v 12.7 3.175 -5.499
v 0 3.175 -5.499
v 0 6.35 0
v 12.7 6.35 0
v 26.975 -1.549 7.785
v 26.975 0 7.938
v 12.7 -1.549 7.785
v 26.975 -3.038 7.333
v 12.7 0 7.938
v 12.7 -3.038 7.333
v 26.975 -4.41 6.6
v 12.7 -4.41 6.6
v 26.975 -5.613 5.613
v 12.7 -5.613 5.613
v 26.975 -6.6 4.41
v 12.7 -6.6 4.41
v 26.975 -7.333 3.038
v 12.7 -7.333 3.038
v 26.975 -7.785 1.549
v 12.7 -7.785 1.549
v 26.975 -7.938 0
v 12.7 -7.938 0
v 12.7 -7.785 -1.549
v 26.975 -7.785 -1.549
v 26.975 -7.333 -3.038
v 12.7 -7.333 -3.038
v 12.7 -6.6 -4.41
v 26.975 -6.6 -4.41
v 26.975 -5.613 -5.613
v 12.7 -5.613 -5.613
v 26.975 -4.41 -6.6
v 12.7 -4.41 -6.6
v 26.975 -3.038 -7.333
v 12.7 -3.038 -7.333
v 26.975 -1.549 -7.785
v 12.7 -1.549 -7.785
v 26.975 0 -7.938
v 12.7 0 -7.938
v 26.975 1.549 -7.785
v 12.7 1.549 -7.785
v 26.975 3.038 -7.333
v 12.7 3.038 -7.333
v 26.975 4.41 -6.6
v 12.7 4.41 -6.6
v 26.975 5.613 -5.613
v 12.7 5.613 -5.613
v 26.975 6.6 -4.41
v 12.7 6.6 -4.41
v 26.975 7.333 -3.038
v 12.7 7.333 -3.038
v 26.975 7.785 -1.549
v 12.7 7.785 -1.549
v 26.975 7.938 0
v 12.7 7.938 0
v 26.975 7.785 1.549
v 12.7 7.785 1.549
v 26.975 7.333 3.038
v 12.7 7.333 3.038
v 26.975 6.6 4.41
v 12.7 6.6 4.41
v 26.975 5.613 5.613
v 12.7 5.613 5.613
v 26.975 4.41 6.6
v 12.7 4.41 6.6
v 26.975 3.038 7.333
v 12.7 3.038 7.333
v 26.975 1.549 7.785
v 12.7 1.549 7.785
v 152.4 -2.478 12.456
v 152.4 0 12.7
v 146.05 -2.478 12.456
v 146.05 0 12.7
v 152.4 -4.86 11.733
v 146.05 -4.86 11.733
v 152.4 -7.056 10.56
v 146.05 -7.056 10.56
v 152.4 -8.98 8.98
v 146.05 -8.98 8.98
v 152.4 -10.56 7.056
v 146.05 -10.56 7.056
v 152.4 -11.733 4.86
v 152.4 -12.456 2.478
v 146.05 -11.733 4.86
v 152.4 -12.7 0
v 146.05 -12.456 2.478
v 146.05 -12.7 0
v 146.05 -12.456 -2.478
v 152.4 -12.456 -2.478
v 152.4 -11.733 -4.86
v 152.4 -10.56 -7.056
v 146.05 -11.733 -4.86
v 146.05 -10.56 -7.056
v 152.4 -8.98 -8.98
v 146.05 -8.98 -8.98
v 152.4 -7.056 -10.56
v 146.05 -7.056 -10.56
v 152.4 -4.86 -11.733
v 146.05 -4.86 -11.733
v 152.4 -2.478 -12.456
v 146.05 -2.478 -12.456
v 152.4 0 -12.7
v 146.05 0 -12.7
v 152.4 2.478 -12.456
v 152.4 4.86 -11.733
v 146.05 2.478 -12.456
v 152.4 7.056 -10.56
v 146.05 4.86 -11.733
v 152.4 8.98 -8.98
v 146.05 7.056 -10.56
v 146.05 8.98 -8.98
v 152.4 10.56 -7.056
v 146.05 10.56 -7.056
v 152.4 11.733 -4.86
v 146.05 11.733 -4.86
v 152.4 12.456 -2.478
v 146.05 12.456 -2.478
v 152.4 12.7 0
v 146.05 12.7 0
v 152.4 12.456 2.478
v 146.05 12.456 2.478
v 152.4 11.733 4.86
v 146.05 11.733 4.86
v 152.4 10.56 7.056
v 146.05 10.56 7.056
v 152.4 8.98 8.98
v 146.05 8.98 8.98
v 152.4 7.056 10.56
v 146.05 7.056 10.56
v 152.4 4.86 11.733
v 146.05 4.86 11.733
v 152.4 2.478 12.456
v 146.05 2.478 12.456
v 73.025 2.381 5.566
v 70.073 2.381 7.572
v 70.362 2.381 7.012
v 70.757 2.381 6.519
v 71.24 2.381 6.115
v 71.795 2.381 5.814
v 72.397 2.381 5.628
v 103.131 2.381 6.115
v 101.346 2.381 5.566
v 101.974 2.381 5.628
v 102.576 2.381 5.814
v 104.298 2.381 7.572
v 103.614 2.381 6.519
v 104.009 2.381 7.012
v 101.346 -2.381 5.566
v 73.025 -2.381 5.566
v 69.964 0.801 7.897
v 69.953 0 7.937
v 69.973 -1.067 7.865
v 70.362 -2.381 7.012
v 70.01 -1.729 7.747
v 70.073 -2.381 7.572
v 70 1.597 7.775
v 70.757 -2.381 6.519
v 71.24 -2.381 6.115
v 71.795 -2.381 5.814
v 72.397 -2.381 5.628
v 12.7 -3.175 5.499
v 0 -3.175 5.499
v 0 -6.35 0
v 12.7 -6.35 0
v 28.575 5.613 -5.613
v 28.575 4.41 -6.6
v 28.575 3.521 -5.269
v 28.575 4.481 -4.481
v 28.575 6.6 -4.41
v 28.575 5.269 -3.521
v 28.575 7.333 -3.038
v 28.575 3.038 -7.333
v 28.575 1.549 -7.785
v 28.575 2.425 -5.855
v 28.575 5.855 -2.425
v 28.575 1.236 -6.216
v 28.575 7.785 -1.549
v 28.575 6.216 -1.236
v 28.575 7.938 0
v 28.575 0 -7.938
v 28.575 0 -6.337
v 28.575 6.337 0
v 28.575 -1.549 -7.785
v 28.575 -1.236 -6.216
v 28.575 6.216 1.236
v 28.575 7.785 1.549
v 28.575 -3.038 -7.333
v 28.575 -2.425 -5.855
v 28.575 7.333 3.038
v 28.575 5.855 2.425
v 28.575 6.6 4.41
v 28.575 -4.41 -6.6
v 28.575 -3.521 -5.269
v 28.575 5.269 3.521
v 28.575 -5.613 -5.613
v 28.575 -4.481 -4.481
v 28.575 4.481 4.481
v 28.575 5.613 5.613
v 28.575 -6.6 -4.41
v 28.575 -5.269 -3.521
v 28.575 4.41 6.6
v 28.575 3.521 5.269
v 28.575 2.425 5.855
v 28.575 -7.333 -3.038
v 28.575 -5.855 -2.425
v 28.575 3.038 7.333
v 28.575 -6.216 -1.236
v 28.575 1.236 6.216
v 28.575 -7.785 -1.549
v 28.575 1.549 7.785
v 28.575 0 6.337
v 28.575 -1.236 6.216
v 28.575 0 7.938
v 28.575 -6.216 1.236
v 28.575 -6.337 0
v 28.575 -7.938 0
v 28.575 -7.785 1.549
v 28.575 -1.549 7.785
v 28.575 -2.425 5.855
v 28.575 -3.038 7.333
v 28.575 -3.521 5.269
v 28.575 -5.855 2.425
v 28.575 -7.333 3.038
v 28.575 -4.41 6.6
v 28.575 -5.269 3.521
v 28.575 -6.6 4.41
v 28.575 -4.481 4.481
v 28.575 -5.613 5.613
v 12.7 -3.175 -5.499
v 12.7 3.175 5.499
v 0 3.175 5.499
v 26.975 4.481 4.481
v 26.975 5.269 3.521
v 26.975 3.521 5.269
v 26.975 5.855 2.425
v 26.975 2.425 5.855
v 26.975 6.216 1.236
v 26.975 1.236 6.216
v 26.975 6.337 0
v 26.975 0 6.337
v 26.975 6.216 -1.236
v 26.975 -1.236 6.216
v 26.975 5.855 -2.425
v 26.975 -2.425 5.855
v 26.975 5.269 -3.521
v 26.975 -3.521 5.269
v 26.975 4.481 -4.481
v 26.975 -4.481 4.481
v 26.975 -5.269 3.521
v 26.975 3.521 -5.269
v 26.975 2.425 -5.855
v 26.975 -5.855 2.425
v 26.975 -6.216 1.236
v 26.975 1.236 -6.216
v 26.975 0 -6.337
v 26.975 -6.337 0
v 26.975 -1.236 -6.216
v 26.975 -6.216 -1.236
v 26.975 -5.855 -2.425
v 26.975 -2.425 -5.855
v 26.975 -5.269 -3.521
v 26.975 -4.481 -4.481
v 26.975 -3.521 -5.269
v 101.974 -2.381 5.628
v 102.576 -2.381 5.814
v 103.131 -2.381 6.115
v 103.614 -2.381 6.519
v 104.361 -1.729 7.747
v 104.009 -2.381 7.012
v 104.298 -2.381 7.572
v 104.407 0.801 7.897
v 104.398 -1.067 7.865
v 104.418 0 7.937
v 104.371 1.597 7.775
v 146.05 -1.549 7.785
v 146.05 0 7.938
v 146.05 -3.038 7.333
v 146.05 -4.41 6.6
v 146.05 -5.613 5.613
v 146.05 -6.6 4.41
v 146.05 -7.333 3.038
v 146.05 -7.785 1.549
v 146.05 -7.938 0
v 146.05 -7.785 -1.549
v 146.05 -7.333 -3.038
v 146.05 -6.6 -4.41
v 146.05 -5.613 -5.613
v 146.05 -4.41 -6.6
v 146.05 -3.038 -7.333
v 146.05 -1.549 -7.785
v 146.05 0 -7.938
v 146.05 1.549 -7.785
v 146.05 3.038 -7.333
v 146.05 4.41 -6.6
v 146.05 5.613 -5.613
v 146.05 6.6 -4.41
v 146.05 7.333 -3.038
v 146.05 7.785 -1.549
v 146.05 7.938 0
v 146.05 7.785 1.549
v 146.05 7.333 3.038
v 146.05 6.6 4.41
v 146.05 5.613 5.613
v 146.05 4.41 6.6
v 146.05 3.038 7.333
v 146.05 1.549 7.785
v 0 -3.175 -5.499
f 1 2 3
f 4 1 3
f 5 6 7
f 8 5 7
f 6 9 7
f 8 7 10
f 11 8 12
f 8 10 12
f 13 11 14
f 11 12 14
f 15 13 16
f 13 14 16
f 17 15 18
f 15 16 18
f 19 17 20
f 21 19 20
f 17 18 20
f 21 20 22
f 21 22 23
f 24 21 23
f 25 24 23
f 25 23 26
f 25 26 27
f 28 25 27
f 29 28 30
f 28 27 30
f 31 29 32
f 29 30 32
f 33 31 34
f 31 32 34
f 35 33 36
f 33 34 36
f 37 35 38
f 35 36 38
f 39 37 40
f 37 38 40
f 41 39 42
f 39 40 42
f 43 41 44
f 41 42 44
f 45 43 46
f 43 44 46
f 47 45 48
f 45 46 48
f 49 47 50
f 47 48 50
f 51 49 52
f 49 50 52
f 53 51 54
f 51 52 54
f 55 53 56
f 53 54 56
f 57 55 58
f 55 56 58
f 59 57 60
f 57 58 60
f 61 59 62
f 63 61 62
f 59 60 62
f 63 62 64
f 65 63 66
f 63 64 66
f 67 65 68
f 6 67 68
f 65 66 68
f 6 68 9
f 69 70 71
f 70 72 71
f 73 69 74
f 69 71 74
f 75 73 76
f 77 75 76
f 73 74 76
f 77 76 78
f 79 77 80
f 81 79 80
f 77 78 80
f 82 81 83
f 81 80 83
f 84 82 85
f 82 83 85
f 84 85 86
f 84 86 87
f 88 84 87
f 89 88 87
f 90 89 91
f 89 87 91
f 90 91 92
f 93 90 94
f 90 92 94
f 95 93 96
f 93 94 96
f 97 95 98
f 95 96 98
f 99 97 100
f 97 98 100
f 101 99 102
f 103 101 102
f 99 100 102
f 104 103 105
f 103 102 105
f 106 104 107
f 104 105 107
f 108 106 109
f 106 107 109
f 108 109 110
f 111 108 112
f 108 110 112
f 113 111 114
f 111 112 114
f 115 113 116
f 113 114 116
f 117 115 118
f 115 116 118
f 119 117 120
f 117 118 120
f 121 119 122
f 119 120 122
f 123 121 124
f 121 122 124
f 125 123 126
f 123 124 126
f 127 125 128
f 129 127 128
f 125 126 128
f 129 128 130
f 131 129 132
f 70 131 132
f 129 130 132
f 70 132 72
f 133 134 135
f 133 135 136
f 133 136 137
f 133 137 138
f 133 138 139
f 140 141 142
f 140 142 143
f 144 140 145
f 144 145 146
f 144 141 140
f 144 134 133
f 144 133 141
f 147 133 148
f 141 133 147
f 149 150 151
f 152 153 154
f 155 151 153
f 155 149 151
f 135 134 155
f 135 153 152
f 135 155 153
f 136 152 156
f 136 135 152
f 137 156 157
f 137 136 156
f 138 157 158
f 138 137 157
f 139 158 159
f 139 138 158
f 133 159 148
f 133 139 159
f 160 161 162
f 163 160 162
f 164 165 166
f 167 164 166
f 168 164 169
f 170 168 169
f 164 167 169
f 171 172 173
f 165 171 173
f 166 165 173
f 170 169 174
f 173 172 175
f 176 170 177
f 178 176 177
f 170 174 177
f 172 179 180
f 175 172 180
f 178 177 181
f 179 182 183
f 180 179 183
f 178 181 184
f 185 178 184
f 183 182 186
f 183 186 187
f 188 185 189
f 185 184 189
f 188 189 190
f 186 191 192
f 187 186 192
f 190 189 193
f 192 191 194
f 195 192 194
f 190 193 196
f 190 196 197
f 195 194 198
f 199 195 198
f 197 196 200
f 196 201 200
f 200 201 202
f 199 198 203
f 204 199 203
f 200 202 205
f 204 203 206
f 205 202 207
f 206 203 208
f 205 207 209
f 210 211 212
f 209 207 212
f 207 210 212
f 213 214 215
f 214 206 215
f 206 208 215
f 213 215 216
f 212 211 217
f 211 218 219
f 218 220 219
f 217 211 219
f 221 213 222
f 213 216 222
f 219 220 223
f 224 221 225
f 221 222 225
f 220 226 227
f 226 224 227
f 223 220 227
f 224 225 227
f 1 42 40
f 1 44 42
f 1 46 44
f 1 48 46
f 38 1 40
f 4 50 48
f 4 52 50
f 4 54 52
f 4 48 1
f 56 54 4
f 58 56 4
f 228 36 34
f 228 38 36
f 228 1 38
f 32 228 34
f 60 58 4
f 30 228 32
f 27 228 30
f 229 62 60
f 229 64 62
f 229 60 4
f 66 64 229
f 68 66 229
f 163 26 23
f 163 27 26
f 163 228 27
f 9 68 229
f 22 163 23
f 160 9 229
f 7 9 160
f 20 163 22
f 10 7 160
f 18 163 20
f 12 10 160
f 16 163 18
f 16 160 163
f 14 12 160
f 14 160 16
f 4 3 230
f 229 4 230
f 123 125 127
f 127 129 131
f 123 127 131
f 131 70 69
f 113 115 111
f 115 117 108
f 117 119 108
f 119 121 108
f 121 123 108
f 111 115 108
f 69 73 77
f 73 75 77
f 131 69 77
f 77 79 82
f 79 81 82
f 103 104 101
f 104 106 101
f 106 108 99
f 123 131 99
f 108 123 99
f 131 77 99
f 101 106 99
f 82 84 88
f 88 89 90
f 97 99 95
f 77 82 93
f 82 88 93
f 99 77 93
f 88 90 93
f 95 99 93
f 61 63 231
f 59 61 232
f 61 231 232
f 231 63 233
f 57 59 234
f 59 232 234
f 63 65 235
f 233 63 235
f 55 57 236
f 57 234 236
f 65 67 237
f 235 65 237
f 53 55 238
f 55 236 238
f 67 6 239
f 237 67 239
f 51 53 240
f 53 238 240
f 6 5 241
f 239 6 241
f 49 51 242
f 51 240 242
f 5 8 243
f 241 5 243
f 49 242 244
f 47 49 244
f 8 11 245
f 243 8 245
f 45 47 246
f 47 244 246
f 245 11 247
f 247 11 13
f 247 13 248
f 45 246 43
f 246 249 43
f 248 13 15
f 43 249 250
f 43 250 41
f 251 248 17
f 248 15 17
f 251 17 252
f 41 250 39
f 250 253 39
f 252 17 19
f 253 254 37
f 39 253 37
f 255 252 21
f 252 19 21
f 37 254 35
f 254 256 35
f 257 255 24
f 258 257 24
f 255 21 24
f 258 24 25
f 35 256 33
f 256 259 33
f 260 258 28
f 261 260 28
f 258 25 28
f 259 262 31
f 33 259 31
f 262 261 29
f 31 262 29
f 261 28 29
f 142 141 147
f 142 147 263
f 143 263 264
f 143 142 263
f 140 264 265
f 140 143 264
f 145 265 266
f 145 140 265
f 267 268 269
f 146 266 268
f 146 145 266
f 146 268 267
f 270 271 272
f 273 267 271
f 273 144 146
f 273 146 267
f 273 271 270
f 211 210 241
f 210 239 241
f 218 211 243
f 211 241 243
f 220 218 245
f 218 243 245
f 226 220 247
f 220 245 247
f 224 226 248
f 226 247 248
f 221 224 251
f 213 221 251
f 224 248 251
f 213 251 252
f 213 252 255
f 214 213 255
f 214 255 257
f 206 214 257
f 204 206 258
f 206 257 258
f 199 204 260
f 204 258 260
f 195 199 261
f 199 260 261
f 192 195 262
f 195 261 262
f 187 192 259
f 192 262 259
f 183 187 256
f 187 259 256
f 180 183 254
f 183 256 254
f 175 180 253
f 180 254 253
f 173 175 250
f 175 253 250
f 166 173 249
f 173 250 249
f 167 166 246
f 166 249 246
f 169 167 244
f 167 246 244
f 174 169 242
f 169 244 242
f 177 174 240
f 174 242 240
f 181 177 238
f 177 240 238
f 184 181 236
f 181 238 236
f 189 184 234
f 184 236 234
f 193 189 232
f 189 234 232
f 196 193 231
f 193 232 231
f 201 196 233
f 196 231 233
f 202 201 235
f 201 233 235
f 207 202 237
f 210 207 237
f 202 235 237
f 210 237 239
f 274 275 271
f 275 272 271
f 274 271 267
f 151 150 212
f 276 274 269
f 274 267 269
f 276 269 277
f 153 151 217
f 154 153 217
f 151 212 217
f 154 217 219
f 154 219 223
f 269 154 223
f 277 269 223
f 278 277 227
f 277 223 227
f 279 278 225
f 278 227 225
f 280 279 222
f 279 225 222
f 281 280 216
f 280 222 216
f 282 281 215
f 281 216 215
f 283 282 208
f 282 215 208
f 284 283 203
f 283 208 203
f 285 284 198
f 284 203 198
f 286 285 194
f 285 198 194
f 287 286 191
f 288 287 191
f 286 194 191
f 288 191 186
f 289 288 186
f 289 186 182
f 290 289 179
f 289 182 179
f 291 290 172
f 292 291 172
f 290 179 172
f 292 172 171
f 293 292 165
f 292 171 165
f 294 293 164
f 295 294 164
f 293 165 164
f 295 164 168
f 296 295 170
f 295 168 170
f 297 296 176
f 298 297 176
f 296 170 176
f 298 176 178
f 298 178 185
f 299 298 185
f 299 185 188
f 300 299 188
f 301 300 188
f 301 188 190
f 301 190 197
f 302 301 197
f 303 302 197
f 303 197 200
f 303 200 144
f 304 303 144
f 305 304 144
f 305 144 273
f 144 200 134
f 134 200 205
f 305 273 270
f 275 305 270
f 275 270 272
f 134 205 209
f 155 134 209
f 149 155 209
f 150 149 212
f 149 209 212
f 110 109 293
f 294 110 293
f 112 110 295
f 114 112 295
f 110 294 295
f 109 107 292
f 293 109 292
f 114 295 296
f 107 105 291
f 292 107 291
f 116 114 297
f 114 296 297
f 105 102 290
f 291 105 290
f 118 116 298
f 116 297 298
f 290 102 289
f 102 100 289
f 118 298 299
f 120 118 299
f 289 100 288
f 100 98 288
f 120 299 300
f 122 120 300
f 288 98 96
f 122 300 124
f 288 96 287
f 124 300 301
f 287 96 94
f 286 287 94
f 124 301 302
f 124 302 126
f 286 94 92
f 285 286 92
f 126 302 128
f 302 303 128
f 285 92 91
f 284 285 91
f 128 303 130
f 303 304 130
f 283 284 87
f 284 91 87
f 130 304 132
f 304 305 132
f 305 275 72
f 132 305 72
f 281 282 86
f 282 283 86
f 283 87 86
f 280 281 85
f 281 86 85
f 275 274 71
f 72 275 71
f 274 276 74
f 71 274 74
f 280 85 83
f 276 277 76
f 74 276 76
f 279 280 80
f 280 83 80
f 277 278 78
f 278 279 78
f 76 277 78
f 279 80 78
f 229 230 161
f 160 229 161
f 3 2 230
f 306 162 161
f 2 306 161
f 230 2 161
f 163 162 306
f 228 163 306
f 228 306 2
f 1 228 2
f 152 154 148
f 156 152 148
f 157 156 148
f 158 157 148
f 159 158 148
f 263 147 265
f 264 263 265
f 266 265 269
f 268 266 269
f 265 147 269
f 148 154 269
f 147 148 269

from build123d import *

# Parameters (mm, degrees)
F3_DEPTH      = 2.38125
F3_DEPTH_BACK = 2.38125
F5_DEPTH      = 12.7


with BuildPart() as f1:
    # F0 (on Front) → F1 (revolve)
    with BuildSketch(Plane.XZ):
        Polygon((12.7, 6.35), (0, 6.35), (0, 0), (152.4, 0), (152.4, 12.7), (146.05, 12.7), (146.05, 7.9375), (28.575, 7.9375), (28.575, 6.3373), (26.9748, 6.3373), (26.9748, 7.9375), (12.7, 7.9375), align=None)
    revolve(axis=Axis((76.2, 0, 0), (1, 0, 0)))

    # F2 (on Front) → F3 (cut, two sides)
    with BuildSketch(Plane.XZ) as f3_sk:
        with BuildLine():
            Line((104.5209977589, 15.0908644997), (69.8499977589, 15.0908644997))
            Line((69.8499977589, 15.0908644997), (69.8499977589, 8.7408644997))
            ThreePointArc((69.8499977589, 8.7408644997), (70.7799337286, 6.4958004694), (73.0249977589, 5.5658644997))
            Line((73.0249977589, 5.5658644997), (101.3459977589, 5.5658644997))
            ThreePointArc((101.3459977589, 5.5658644997), (103.5910617891, 6.4958004694), (104.5209977589, 8.7408644997))
            Line((104.5209977589, 8.7408644997), (104.5209977589, 15.0908644997))
        make_face()
    extrude(amount=-F3_DEPTH, mode=Mode.SUBTRACT)
    extrude(f3_sk.sketch, amount=F3_DEPTH_BACK, mode=Mode.SUBTRACT)

    # F4 (on face) → F5 (cut, through all)
    with BuildSketch(Plane(origin=(0, 0, 0), x_dir=(0, -1, 0), z_dir=(-1, 0, 0))):
        with BuildLine():
            Line((-6.35, 0), (-3.175, 5.499261314))
            ThreePointArc((-3.175, 5.499261314), (-5.499261314, 3.175), (-6.35, 0))
        make_face()
        with BuildLine():
            ThreePointArc((3.175, 5.499261314), (0, 6.35), (-3.175, 5.499261314))
            Line((-3.175, 5.499261314), (3.175, 5.499261314))
        make_face()
        with BuildLine():
            ThreePointArc((6.35, 0), (5.499261314, 3.175), (3.175, 5.499261314))
            Line((3.175, 5.499261314), (6.35, 0))
        make_face()
        with BuildLine():
            ThreePointArc((3.175, -5.499261314), (5.499261314, -3.175), (6.35, 0))
            Line((6.35, 0), (3.175, -5.499261314))
        make_face()
        with BuildLine():
            Line((3.175, -5.499261314), (-3.175, -5.499261314))
            ThreePointArc((-3.175, -5.499261314), (0, -6.35), (3.175, -5.499261314))
        make_face()
        with BuildLine():
            Line((-3.175, -5.499261314), (-6.35, 0))
            ThreePointArc((-6.35, 0), (-5.499261314, -3.175), (-3.175, -5.499261314))
        make_face()
    extrude(amount=-F5_DEPTH, mode=Mode.SUBTRACT)


solid = f1.part
